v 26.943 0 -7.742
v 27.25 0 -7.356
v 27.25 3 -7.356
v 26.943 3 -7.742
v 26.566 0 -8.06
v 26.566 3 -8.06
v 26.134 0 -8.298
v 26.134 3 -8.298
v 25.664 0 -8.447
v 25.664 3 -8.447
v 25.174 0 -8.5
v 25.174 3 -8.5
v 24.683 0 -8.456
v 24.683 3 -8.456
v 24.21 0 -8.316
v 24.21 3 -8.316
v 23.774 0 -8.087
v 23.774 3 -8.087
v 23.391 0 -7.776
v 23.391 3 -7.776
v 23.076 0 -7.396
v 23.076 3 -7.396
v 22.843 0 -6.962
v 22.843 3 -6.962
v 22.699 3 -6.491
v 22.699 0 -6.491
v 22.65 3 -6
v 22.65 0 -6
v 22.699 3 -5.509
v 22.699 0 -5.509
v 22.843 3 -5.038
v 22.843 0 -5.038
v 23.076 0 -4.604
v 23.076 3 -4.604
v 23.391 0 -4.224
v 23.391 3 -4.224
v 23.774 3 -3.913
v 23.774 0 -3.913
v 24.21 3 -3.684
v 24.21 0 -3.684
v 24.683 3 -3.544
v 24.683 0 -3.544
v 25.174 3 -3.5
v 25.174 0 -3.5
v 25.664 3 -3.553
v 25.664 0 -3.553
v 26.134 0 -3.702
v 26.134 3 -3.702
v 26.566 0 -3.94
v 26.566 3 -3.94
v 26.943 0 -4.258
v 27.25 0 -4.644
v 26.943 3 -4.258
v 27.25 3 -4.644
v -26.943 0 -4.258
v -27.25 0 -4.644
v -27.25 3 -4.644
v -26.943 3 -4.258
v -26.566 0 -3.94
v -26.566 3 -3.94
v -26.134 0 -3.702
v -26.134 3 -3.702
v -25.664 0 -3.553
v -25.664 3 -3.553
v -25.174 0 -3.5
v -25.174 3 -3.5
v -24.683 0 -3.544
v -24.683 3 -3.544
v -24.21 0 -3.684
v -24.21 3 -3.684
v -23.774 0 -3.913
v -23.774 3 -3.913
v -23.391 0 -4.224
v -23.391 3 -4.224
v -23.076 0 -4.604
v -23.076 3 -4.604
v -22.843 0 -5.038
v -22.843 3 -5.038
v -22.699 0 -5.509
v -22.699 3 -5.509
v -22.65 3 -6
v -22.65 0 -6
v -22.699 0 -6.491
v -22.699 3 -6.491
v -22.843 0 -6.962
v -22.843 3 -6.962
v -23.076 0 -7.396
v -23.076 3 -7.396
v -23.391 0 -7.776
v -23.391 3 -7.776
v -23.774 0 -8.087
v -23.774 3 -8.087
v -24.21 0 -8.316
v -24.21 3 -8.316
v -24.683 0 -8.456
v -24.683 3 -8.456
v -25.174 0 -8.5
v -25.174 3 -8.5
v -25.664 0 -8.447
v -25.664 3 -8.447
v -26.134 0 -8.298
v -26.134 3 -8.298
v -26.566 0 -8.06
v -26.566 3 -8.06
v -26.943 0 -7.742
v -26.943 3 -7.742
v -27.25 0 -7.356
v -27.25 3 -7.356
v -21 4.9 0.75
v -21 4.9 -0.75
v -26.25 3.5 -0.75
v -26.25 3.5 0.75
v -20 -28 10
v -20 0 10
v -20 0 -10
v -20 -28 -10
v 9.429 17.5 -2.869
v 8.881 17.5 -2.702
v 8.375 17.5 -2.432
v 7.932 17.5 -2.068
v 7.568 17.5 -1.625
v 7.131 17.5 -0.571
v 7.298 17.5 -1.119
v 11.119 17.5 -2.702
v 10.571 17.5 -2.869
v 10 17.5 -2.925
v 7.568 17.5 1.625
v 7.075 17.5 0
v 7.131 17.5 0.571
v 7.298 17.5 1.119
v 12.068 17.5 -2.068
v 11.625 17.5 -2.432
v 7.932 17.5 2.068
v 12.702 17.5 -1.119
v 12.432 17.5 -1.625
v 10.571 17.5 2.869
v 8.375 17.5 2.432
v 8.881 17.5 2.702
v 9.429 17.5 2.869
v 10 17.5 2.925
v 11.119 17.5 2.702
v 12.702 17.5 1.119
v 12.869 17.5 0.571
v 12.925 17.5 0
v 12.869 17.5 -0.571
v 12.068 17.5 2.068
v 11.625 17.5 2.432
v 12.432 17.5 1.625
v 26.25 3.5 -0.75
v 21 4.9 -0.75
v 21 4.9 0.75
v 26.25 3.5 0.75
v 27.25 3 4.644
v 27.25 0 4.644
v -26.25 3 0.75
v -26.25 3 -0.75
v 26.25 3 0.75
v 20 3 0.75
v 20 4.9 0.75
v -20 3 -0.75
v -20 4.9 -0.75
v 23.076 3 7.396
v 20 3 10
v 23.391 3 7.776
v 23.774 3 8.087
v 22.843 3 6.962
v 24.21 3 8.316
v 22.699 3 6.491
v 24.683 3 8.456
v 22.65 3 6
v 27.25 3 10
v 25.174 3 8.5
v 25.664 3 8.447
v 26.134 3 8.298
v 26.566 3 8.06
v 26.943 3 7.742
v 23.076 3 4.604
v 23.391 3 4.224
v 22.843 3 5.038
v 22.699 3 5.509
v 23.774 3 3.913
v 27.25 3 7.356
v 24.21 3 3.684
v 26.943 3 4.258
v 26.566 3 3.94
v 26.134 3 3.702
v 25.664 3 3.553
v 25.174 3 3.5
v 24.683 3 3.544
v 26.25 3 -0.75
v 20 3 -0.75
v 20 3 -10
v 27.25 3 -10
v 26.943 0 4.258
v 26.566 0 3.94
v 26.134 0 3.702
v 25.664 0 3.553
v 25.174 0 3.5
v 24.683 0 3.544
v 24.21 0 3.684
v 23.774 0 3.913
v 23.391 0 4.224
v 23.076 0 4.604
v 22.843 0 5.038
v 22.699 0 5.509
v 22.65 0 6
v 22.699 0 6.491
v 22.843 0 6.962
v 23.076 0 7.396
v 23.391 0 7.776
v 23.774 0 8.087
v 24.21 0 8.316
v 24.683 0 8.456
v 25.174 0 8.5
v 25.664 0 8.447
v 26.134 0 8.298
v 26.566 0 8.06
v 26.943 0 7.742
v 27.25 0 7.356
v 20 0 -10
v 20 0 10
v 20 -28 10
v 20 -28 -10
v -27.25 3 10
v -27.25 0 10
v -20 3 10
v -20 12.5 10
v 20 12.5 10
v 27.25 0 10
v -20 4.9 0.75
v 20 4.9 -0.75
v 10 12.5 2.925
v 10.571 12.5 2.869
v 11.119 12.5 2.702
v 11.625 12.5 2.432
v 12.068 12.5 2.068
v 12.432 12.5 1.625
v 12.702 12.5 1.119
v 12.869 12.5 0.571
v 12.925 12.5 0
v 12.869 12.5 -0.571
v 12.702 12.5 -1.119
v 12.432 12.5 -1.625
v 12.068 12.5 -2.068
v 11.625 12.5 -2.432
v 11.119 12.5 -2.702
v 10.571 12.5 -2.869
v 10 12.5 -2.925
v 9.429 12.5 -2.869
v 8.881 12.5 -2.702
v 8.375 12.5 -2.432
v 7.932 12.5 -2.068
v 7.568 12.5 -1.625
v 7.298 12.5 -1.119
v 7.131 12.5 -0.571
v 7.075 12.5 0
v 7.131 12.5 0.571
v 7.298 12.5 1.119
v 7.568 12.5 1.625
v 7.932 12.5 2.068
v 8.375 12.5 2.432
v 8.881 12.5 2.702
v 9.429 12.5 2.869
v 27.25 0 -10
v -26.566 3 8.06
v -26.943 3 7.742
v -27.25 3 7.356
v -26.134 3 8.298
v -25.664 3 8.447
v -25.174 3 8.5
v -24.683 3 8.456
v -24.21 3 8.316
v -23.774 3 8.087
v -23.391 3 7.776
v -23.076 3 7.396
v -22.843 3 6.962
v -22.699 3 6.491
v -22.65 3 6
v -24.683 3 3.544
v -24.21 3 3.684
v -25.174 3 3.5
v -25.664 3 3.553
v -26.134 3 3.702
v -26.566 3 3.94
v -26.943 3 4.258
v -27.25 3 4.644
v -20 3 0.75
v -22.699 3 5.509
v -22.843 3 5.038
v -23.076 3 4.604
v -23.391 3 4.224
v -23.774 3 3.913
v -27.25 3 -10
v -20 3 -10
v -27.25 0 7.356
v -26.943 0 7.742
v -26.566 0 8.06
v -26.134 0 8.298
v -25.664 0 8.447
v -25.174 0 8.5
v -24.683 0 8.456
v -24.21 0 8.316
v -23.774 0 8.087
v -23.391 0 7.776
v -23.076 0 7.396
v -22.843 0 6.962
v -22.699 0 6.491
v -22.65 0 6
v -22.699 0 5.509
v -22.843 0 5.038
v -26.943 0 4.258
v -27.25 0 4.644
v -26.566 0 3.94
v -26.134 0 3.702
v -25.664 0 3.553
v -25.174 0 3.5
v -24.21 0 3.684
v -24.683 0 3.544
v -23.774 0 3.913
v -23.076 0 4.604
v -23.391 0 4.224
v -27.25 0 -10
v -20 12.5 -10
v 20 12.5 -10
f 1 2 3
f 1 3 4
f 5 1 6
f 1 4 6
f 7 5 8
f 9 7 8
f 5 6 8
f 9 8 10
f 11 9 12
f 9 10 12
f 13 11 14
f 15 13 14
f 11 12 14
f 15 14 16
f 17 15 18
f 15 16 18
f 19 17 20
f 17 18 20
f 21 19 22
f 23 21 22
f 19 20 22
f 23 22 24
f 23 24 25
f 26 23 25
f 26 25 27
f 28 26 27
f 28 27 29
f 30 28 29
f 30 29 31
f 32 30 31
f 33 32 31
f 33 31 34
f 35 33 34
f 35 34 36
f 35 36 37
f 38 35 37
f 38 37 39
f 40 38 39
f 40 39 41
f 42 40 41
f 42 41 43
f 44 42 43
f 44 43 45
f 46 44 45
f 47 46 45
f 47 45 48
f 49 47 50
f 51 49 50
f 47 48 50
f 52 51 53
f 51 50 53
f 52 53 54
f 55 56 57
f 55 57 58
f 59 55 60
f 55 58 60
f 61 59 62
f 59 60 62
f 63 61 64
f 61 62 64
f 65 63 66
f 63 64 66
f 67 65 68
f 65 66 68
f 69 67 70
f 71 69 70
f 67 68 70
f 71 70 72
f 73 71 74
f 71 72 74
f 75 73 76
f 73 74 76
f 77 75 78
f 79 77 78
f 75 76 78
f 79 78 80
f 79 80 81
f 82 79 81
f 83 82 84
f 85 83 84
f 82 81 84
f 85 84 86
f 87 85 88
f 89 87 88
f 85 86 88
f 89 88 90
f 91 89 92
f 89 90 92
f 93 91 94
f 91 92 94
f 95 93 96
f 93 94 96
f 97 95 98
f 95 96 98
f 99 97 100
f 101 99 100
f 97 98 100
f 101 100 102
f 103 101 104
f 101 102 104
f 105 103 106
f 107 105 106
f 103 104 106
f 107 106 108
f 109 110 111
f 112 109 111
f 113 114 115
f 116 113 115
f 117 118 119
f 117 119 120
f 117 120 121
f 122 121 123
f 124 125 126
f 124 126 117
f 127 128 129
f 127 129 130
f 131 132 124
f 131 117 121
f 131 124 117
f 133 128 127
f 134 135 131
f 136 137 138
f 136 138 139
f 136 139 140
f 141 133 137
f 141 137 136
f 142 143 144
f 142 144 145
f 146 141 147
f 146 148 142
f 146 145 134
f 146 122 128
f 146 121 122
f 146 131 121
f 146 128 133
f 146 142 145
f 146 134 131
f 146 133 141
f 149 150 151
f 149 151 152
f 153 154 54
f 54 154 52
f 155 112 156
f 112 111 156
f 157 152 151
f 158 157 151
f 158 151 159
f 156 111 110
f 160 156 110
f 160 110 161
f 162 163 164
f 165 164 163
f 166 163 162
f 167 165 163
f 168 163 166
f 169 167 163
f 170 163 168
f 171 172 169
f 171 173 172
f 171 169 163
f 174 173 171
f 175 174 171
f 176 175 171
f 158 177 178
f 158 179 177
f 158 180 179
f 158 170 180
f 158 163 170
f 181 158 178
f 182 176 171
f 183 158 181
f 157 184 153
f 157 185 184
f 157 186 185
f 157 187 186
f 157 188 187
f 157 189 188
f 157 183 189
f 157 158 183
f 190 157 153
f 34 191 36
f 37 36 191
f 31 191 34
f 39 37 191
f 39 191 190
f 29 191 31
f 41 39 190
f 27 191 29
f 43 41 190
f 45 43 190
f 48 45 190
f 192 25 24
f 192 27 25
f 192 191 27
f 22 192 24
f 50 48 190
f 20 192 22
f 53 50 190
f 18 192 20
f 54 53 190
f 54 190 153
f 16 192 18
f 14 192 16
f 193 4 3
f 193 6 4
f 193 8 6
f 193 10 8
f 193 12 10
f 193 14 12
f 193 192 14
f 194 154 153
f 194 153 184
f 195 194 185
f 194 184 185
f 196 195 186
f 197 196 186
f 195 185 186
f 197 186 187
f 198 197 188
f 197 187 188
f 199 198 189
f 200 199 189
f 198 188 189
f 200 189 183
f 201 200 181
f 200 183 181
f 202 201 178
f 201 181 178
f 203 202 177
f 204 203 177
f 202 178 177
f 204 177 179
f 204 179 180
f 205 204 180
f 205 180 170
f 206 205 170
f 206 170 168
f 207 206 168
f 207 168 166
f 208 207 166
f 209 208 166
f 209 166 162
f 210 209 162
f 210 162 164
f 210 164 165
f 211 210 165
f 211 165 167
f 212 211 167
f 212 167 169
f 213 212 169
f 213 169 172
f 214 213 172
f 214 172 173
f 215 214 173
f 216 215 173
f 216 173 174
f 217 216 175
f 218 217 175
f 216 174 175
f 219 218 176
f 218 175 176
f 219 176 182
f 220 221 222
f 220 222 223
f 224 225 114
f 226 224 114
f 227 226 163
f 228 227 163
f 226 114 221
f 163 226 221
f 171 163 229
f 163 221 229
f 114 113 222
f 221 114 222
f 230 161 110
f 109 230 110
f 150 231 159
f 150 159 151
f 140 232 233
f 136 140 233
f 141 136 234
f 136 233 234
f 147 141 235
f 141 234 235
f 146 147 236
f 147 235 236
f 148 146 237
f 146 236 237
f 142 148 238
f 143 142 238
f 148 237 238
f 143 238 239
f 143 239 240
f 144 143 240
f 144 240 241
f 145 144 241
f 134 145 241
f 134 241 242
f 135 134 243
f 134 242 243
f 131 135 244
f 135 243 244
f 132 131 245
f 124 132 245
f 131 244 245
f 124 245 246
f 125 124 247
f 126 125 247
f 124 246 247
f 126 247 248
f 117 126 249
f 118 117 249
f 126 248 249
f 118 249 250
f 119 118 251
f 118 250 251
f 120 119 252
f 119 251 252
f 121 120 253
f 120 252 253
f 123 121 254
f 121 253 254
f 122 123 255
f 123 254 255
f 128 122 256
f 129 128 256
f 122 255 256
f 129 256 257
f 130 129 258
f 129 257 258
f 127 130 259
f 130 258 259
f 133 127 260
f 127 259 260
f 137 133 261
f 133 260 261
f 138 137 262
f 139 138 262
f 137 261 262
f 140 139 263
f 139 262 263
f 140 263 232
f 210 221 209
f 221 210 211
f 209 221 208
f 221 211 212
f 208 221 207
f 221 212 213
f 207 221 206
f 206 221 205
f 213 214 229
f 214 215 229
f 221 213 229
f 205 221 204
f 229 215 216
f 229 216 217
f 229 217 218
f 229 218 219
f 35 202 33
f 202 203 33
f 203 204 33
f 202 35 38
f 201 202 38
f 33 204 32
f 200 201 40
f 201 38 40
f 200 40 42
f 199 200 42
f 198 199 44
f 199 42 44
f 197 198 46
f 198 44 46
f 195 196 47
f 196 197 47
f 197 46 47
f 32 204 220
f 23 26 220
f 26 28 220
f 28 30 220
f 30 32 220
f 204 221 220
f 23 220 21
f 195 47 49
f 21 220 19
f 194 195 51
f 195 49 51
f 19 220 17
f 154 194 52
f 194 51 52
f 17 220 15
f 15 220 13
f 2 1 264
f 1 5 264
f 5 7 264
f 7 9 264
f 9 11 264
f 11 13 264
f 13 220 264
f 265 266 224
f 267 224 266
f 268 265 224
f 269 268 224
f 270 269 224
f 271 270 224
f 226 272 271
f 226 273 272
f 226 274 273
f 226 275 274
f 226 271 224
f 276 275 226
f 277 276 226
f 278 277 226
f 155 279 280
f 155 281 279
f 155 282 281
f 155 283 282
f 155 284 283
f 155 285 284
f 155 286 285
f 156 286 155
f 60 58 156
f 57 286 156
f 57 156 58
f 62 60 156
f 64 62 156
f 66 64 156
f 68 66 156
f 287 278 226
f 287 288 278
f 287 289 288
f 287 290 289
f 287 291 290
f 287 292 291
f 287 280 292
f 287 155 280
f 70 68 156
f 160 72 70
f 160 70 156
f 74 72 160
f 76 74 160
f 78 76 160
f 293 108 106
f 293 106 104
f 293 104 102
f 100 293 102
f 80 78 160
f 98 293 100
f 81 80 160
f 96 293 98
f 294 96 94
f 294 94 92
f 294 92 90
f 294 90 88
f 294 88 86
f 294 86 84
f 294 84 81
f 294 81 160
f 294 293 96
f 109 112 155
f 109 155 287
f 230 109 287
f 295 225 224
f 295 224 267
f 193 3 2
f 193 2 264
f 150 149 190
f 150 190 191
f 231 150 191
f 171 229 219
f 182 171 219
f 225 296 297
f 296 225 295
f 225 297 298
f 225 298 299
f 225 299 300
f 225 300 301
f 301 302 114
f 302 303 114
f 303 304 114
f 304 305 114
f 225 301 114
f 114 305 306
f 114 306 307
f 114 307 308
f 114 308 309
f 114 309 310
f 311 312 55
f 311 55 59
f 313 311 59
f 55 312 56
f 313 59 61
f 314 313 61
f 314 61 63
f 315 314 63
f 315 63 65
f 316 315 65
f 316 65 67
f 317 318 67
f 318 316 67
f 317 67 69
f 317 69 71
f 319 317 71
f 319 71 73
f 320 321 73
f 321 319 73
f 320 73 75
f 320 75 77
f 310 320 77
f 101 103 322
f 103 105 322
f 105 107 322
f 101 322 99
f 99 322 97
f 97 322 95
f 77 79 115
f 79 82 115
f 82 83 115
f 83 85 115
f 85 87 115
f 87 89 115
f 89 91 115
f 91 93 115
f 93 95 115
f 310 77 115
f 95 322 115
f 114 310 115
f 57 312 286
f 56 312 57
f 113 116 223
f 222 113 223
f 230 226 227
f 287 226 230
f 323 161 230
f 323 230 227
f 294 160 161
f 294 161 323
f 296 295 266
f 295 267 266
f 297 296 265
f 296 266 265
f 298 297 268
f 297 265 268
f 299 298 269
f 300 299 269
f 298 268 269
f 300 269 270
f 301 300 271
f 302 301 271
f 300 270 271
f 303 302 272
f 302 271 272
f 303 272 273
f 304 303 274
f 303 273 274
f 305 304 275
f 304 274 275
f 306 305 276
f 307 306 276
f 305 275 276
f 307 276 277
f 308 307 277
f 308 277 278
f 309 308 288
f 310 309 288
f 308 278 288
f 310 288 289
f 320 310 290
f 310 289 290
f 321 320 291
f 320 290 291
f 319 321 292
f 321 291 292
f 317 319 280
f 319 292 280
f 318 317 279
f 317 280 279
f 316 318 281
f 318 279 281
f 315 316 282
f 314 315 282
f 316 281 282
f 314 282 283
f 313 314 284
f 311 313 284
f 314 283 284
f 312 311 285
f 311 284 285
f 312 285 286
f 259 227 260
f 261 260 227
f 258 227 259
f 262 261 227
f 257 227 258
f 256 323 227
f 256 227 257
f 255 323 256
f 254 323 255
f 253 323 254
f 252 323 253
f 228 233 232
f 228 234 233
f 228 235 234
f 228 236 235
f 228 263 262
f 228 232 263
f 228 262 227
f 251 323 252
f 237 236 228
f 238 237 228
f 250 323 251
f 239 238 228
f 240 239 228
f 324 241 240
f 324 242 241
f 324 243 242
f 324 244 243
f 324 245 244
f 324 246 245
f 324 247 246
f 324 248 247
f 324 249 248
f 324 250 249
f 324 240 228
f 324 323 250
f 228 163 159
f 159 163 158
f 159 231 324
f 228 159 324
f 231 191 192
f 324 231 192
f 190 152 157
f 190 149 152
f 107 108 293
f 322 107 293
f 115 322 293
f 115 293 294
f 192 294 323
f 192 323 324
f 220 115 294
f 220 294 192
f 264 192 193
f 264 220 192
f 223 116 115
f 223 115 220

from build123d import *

# Parameters (mm, degrees)
SKETCH1_W           = 40
SKETCH1_H           = 20
BOSS_EXTRUDE1_DEPTH = 28
SKETCH2_W           = 54.5
SKETCH2_H           = 20
BOSS_EXTRUDE2_DEPTH = 3
SKETCH3_W           = 40
SKETCH3_H           = 20
BOSS_EXTRUDE3_DEPTH = 9.5
SKETCH4_R           = 2.925
BOSS_EXTRUDE4_DEPTH = 5
SKETCH5_R           = 2.5
CUT_EXTRUDE1_DEPTH  = 3
BOSS_EXTRUDE5_START = -10
BOSS_EXTRUDE5_DEPTH = 0.75


with BuildPart() as part:
    # Sketch1 → Boss-Extrude1 (new body)
    with BuildSketch(Plane(origin=(0, 0, 0), x_dir=(1, 0, 0), z_dir=(0, 1, 0))):
        Rectangle(SKETCH1_W, SKETCH1_H)
    extrude(amount=-BOSS_EXTRUDE1_DEPTH)

    # Sketch2 → Boss-Extrude2 (add)
    with BuildSketch(Plane(origin=(0, 0, 0), x_dir=(1, 0, 0), z_dir=(0, 1, 0))):
        Rectangle(SKETCH2_W, SKETCH2_H)
    extrude(amount=BOSS_EXTRUDE2_DEPTH)

    # Sketch3 → Boss-Extrude3 (add)
    with BuildSketch(Plane(origin=(0, 3, 0), x_dir=(1, 0, 0), z_dir=(0, 1, 0))):
        Rectangle(SKETCH3_W, SKETCH3_H)
    extrude(amount=BOSS_EXTRUDE3_DEPTH)

    # Sketch4 → Boss-Extrude4 (add)
    with BuildSketch(Plane(origin=(0, 12.5, 0), x_dir=(1, 0, 0), z_dir=(0, 1, 0))):
        with Locations(Location((10, 0, 0), (0, 0, 270))):
            Circle(SKETCH4_R)
    extrude(amount=BOSS_EXTRUDE4_DEPTH)

    # Sketch5 → Cut-Extrude1 (cut)
    with BuildSketch(Plane(origin=(0, 3, 0), x_dir=(1, 0, 0), z_dir=(0, 1, 0))):
        with Locations((25.15, -6)):
            Circle(SKETCH5_R)
        with Locations((25.15, 6)):
            Circle(SKETCH5_R)
        with Locations((-25.15, -6)):
            Circle(SKETCH5_R)
        with Locations((-25.15, 6)):
            Circle(SKETCH5_R)
    extrude(amount=-CUT_EXTRUDE1_DEPTH, mode=Mode.SUBTRACT)

    # Sketch6 → Boss-Extrude5 (add, symmetric)
    with BuildSketch(Plane(origin=(0, 0, -10), x_dir=(-1, 0, 0), z_dir=(0, 0, -1)).offset(BOSS_EXTRUDE5_START)):
        Polygon((-20, 3), (-20, 4.9), (-21, 4.9), (-26.25, 3.5), (-26.25, 3), align=None)
    boss_extrude5 = extrude(amount=BOSS_EXTRUDE5_DEPTH, both=True)

    # Mirror1: Boss-Extrude5 across plane
    add(boss_extrude5.mirror(Plane(origin=(0, 0, 0), x_dir=(0, 0, 1), z_dir=(1, 0, 0))))


solid = part.part
